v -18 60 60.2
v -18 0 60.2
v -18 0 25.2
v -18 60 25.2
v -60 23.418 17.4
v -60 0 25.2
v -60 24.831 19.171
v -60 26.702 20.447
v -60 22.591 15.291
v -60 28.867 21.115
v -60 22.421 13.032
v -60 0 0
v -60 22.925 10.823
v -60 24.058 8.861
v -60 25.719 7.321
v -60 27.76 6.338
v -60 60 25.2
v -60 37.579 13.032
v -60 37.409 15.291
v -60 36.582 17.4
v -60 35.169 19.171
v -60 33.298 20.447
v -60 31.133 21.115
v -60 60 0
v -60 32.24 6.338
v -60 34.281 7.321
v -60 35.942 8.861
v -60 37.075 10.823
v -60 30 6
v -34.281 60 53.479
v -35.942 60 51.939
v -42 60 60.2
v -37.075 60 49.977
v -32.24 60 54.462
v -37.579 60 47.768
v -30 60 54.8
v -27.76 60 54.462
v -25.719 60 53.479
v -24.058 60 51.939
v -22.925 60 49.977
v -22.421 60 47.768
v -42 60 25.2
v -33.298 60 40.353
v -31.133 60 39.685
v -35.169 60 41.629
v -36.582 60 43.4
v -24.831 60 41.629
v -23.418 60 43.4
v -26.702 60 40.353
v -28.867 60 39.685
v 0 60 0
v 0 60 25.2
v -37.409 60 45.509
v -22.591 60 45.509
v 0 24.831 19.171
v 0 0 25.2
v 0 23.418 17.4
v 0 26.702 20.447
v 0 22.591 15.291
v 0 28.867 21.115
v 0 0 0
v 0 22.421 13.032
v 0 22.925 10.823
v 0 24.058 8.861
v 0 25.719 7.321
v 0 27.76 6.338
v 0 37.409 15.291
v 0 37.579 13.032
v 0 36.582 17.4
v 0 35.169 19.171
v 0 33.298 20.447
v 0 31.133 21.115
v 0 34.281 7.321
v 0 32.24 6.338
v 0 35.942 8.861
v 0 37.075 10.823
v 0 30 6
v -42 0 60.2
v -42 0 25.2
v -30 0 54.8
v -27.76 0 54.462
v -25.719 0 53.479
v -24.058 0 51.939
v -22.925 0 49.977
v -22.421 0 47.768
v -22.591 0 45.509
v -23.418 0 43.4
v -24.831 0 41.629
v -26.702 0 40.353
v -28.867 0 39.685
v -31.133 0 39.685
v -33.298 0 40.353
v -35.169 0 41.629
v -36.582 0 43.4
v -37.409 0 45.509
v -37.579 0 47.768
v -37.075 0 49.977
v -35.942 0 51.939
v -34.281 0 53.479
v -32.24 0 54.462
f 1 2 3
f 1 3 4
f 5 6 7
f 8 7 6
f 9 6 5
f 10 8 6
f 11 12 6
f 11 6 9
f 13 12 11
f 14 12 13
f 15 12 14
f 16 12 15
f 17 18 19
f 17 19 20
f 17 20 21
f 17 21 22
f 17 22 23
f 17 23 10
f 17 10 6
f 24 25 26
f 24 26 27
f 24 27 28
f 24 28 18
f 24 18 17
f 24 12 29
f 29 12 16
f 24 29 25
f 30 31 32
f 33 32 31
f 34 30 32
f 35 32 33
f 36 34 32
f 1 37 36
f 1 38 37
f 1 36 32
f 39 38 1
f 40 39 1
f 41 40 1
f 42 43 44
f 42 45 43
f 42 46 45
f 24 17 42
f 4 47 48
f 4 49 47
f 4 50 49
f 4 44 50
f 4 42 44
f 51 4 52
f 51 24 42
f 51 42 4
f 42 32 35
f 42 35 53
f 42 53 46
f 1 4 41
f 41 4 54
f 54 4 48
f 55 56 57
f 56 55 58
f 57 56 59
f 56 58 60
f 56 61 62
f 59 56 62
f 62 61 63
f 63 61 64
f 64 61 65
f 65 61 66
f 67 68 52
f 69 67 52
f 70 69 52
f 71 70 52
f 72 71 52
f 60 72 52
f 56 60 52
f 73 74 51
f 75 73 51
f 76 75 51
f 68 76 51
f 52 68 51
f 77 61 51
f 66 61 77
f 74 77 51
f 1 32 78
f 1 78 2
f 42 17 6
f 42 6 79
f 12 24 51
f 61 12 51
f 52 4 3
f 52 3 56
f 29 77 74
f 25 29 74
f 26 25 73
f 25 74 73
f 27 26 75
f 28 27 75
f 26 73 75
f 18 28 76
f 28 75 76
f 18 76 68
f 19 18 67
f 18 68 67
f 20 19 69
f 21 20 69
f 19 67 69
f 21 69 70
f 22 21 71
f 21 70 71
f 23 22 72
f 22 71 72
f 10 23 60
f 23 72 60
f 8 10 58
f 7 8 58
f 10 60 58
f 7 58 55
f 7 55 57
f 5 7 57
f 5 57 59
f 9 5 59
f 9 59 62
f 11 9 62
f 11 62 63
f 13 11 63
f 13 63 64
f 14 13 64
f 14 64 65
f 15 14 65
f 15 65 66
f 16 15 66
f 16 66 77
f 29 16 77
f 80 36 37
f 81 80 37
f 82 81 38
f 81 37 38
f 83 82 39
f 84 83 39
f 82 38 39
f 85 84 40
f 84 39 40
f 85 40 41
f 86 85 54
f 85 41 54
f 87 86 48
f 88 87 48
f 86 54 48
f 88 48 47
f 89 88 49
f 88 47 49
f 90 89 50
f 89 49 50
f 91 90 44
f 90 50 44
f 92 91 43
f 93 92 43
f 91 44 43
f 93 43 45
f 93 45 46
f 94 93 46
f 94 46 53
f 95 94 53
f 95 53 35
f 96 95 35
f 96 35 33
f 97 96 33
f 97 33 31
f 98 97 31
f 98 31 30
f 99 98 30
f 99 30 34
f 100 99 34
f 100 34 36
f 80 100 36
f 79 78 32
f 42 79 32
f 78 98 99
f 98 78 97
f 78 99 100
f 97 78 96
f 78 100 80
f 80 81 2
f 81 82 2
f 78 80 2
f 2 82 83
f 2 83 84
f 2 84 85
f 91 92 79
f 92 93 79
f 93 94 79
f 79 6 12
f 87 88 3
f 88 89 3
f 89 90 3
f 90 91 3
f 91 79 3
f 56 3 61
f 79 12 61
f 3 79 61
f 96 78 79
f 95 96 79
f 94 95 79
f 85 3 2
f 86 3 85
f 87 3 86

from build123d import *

# Parameters (mm, degrees)
SCHIZZO1_W                   = 60
SCHIZZO1_H                   = 60
ESTRUSIONE_ESTRUSIONE1_DEPTH = 60.2
SCHIZZO2_R                   = 7.6
TAGLIO_ESTRUSIONE1_DEPTH     = 105.038646666
SCHIZZO3_R                   = 7.6
TAGLIO_ESTRUSIONE2_DEPTH     = 105.038646666
SCHIZZO4_W                   = 18
SCHIZZO4_H                   = 60
TAGLIO_ESTRUSIONE3_DEPTH     = 35


with BuildPart() as part:
    # Schizzo1 → Estrusione-Estrusione1 (new body)
    with BuildSketch(Plane.XY):
        with Locations((-30, 30)):
            Rectangle(SCHIZZO1_W, SCHIZZO1_H)
    extrude(amount=ESTRUSIONE_ESTRUSIONE1_DEPTH)

    # Schizzo2 → Taglio-Estrusione1 (cut, through all)
    with BuildSketch(Plane(origin=(0, 0, 0), x_dir=(0, 0, -1), z_dir=(1, 0, 0))):
        with Locations((-13.6, 30)):
            Circle(SCHIZZO2_R)
    extrude(amount=-TAGLIO_ESTRUSIONE1_DEPTH, mode=Mode.SUBTRACT)

    # Schizzo3 → Taglio-Estrusione2 (cut, through all)
    with BuildSketch(Plane(origin=(0, 60, 0), x_dir=(0, 0, -1), z_dir=(0, 1, 0))):
        with Locations(Location((-47.2, 30, 0), (0, 0, 180))):
            Circle(SCHIZZO3_R)
    extrude(amount=-TAGLIO_ESTRUSIONE2_DEPTH, mode=Mode.SUBTRACT)

    # Schizzo4 → Taglio-Estrusione3 (cut)
    with BuildSketch(Plane.XY.offset(60.2)):
        with Locations((-51, 30)):
            Rectangle(SCHIZZO4_W, SCHIZZO4_H)
        with Locations((-9, 30)):
            Rectangle(SCHIZZO4_W, SCHIZZO4_H)
    extrude(amount=-TAGLIO_ESTRUSIONE3_DEPTH, mode=Mode.SUBTRACT)


solid = part.part
